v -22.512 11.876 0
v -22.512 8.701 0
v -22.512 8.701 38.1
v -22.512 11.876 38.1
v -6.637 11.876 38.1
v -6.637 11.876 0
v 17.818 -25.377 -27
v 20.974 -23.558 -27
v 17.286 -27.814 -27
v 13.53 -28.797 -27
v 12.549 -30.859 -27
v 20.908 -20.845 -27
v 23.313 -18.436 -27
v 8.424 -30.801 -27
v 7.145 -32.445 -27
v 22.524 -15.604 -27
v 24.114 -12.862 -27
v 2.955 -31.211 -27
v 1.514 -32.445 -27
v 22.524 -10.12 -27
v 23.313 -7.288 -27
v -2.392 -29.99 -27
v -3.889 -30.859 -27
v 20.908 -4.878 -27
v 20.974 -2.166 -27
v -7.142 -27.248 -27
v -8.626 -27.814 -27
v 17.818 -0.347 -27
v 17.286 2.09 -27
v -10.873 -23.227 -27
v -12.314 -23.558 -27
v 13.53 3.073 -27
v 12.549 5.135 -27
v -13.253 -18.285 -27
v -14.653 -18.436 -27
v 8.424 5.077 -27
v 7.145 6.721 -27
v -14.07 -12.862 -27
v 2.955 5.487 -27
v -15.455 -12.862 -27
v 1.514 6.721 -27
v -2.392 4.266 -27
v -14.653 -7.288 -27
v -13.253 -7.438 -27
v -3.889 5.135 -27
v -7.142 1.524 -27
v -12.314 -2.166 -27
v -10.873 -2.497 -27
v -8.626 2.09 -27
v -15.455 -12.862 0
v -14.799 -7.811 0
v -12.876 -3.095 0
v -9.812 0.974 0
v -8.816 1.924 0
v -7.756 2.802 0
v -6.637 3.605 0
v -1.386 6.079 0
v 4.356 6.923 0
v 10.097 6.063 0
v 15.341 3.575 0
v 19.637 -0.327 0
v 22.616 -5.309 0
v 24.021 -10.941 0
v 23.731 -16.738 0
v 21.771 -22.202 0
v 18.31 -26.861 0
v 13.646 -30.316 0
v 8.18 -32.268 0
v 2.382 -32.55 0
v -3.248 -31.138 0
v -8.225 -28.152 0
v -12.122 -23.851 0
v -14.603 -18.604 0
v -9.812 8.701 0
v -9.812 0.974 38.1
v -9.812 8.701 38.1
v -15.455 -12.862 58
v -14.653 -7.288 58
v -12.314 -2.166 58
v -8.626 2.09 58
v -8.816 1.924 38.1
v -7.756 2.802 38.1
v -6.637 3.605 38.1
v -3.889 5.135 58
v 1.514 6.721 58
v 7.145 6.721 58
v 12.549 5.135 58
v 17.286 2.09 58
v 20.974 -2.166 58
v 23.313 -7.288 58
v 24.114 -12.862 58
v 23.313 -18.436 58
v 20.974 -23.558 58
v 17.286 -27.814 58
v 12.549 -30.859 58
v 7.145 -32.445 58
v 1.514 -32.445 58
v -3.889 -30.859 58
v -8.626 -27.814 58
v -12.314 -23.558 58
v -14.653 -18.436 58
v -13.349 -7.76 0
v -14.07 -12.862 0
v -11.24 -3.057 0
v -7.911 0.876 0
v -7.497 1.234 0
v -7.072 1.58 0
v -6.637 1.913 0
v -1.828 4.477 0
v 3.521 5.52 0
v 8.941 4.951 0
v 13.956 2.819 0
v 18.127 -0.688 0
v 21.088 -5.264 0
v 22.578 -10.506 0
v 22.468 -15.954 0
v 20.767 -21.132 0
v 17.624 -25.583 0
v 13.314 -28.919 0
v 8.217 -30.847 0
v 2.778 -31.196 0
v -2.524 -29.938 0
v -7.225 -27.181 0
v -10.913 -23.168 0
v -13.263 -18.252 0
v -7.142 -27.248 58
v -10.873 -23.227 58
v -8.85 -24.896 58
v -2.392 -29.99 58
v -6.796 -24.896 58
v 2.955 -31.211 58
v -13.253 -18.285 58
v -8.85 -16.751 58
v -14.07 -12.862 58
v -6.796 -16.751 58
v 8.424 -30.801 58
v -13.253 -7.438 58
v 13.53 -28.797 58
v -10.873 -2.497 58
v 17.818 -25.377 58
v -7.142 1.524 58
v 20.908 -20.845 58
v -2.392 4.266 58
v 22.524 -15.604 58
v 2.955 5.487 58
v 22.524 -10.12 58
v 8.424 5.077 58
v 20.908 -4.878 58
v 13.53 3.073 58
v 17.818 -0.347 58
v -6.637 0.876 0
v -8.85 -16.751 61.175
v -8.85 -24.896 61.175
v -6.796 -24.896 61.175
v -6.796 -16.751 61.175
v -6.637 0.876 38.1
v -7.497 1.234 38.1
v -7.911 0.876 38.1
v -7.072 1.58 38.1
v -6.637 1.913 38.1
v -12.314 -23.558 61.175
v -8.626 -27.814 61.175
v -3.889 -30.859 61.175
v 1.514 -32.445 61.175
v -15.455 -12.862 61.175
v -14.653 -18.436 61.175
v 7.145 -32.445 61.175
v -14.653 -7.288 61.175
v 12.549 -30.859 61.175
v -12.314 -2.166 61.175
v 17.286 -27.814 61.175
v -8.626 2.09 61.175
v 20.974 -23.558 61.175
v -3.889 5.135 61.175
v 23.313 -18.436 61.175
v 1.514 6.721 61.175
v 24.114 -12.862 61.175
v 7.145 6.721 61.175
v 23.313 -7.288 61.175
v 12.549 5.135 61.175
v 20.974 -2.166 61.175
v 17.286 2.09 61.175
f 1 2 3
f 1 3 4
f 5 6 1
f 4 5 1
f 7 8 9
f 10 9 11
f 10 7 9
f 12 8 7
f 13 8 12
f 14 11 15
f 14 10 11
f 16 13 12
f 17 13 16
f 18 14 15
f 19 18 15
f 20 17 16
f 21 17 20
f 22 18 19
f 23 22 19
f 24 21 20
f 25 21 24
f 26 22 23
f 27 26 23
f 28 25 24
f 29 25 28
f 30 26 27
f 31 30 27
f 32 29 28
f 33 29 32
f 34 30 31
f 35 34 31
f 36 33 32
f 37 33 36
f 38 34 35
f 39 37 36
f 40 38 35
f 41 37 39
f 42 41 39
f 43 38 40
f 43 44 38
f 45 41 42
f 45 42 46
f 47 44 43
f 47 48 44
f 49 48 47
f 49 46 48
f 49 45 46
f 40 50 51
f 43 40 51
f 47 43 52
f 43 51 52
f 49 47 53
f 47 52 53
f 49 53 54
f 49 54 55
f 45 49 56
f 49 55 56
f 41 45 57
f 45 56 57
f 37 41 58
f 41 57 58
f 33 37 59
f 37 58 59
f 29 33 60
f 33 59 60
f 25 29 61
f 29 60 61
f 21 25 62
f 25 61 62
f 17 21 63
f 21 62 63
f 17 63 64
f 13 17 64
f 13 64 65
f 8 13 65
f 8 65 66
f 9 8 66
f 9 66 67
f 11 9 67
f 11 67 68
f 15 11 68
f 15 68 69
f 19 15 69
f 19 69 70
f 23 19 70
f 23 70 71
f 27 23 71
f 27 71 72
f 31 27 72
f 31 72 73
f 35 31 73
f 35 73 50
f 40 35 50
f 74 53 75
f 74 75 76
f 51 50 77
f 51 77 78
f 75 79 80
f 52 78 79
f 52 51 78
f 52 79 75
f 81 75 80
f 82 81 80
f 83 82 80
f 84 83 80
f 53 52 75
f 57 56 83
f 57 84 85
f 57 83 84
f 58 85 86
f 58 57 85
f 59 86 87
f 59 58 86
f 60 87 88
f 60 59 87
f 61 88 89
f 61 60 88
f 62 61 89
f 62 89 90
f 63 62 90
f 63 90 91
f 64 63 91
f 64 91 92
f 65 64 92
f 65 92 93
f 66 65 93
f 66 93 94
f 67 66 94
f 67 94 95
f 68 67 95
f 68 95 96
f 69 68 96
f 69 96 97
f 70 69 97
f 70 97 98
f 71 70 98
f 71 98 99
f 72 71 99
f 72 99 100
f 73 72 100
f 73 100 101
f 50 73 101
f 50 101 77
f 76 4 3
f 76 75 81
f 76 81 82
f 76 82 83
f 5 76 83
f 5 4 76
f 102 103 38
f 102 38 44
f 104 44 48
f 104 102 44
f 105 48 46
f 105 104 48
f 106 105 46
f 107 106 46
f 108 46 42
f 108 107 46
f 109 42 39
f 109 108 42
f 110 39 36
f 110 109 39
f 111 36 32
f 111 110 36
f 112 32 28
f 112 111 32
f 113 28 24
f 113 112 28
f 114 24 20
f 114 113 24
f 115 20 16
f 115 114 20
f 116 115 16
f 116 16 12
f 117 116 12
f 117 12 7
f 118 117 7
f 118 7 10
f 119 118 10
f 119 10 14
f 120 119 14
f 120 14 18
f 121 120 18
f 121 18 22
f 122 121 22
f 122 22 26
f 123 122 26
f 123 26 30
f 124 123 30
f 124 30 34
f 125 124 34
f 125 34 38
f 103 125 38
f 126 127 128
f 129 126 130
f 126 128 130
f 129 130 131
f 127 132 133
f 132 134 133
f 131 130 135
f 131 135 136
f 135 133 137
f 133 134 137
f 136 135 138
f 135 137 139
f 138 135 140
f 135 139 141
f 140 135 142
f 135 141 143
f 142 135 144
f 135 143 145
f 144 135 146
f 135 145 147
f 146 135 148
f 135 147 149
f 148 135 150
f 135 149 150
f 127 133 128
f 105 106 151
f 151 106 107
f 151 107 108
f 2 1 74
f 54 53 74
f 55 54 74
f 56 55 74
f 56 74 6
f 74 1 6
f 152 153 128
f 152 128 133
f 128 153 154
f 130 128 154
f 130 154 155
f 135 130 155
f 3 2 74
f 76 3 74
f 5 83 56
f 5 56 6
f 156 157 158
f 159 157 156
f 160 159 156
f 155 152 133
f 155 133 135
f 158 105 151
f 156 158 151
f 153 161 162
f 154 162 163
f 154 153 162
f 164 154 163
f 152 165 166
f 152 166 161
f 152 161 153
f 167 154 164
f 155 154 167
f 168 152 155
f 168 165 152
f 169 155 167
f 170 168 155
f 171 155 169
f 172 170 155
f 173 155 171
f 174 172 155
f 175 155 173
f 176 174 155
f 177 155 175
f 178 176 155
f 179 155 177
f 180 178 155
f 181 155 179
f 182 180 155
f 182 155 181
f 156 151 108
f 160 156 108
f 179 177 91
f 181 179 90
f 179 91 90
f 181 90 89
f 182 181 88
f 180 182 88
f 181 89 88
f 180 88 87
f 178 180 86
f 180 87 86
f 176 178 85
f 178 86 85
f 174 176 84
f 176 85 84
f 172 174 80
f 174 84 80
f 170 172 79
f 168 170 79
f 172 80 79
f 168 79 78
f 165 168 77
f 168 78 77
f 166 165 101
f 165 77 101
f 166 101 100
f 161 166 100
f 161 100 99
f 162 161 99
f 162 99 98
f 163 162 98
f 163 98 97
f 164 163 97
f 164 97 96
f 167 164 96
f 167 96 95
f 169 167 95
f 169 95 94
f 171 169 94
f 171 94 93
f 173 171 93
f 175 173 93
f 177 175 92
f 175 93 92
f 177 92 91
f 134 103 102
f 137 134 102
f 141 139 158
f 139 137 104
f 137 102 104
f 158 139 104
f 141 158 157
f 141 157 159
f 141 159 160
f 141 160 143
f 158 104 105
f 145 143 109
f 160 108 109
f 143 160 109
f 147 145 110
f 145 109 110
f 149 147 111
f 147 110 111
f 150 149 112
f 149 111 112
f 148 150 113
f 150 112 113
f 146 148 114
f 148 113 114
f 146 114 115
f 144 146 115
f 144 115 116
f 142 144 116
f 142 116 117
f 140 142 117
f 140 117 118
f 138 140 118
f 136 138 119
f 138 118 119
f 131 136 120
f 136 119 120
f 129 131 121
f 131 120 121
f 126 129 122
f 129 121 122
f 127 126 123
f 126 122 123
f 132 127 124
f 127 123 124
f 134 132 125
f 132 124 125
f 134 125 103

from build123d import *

# Parameters (mm, degrees)
SKETCH1_W                = 12.7
SKETCH1_H                = 3.175
SKETCH1_W_2              = 3.175
SKETCH1_H_2              = 11
BOSS_EXTRUDE1_DEPTH      = 38.1
SKETCH2_R                = 19.784587186
SKETCH2_R_2              = 18.4
BOSS_EXTRUDE2_DEPTH      = 27
BOSS_EXTRUDE2_DEPTH_BACK = 58
SKETCH3_R                = 19.784587186
BOSS_EXTRUDE3_DEPTH      = 3.175
SKETCH4_W                = 2.053355329
SKETCH4_H                = 8.144976138
CUT_EXTRUDE1_DEPTH       = 3.175


with BuildPart() as part:
    # Sketch1 → Boss-Extrude1 (new body)
    with BuildSketch(Plane.XY):
        with Locations((-16.162006615, 10.28820212)):
            Rectangle(SKETCH1_W, SKETCH1_H)
        with Locations((-8.224506615, 6.37570212)):
            Rectangle(SKETCH1_W_2, SKETCH1_H_2)
    extrude(amount=BOSS_EXTRUDE1_DEPTH)

    # Sketch2 → Boss-Extrude2 (add, two sides)
    with BuildSketch(Plane(origin=(0, 0, 0), x_dir=(-1, 0, 0), z_dir=(0, 0, -1))) as boss_extrude2_sk:
        with Locations((-4.329778131, -12.861954284)):
            Circle(SKETCH2_R)
        with Locations((-4.329778131, -12.861954284)):
            Circle(SKETCH2_R_2, mode=Mode.SUBTRACT)
    extrude(amount=BOSS_EXTRUDE2_DEPTH)
    extrude(boss_extrude2_sk.sketch, amount=-BOSS_EXTRUDE2_DEPTH_BACK)

    # Sketch3 → Boss-Extrude3 (add)
    with BuildSketch(Plane.XY.offset(58)):
        with Locations((4.329778131, -12.861954284)):
            Circle(SKETCH3_R)
    extrude(amount=BOSS_EXTRUDE3_DEPTH)

    # Sketch4 → Cut-Extrude1 (cut)
    with BuildSketch(Plane.XY.offset(61.175)):
        with Locations((-7.822913032, -20.823309264)):
            Rectangle(SKETCH4_W, SKETCH4_H)
    extrude(amount=-CUT_EXTRUDE1_DEPTH, mode=Mode.SUBTRACT)


solid = part.part
